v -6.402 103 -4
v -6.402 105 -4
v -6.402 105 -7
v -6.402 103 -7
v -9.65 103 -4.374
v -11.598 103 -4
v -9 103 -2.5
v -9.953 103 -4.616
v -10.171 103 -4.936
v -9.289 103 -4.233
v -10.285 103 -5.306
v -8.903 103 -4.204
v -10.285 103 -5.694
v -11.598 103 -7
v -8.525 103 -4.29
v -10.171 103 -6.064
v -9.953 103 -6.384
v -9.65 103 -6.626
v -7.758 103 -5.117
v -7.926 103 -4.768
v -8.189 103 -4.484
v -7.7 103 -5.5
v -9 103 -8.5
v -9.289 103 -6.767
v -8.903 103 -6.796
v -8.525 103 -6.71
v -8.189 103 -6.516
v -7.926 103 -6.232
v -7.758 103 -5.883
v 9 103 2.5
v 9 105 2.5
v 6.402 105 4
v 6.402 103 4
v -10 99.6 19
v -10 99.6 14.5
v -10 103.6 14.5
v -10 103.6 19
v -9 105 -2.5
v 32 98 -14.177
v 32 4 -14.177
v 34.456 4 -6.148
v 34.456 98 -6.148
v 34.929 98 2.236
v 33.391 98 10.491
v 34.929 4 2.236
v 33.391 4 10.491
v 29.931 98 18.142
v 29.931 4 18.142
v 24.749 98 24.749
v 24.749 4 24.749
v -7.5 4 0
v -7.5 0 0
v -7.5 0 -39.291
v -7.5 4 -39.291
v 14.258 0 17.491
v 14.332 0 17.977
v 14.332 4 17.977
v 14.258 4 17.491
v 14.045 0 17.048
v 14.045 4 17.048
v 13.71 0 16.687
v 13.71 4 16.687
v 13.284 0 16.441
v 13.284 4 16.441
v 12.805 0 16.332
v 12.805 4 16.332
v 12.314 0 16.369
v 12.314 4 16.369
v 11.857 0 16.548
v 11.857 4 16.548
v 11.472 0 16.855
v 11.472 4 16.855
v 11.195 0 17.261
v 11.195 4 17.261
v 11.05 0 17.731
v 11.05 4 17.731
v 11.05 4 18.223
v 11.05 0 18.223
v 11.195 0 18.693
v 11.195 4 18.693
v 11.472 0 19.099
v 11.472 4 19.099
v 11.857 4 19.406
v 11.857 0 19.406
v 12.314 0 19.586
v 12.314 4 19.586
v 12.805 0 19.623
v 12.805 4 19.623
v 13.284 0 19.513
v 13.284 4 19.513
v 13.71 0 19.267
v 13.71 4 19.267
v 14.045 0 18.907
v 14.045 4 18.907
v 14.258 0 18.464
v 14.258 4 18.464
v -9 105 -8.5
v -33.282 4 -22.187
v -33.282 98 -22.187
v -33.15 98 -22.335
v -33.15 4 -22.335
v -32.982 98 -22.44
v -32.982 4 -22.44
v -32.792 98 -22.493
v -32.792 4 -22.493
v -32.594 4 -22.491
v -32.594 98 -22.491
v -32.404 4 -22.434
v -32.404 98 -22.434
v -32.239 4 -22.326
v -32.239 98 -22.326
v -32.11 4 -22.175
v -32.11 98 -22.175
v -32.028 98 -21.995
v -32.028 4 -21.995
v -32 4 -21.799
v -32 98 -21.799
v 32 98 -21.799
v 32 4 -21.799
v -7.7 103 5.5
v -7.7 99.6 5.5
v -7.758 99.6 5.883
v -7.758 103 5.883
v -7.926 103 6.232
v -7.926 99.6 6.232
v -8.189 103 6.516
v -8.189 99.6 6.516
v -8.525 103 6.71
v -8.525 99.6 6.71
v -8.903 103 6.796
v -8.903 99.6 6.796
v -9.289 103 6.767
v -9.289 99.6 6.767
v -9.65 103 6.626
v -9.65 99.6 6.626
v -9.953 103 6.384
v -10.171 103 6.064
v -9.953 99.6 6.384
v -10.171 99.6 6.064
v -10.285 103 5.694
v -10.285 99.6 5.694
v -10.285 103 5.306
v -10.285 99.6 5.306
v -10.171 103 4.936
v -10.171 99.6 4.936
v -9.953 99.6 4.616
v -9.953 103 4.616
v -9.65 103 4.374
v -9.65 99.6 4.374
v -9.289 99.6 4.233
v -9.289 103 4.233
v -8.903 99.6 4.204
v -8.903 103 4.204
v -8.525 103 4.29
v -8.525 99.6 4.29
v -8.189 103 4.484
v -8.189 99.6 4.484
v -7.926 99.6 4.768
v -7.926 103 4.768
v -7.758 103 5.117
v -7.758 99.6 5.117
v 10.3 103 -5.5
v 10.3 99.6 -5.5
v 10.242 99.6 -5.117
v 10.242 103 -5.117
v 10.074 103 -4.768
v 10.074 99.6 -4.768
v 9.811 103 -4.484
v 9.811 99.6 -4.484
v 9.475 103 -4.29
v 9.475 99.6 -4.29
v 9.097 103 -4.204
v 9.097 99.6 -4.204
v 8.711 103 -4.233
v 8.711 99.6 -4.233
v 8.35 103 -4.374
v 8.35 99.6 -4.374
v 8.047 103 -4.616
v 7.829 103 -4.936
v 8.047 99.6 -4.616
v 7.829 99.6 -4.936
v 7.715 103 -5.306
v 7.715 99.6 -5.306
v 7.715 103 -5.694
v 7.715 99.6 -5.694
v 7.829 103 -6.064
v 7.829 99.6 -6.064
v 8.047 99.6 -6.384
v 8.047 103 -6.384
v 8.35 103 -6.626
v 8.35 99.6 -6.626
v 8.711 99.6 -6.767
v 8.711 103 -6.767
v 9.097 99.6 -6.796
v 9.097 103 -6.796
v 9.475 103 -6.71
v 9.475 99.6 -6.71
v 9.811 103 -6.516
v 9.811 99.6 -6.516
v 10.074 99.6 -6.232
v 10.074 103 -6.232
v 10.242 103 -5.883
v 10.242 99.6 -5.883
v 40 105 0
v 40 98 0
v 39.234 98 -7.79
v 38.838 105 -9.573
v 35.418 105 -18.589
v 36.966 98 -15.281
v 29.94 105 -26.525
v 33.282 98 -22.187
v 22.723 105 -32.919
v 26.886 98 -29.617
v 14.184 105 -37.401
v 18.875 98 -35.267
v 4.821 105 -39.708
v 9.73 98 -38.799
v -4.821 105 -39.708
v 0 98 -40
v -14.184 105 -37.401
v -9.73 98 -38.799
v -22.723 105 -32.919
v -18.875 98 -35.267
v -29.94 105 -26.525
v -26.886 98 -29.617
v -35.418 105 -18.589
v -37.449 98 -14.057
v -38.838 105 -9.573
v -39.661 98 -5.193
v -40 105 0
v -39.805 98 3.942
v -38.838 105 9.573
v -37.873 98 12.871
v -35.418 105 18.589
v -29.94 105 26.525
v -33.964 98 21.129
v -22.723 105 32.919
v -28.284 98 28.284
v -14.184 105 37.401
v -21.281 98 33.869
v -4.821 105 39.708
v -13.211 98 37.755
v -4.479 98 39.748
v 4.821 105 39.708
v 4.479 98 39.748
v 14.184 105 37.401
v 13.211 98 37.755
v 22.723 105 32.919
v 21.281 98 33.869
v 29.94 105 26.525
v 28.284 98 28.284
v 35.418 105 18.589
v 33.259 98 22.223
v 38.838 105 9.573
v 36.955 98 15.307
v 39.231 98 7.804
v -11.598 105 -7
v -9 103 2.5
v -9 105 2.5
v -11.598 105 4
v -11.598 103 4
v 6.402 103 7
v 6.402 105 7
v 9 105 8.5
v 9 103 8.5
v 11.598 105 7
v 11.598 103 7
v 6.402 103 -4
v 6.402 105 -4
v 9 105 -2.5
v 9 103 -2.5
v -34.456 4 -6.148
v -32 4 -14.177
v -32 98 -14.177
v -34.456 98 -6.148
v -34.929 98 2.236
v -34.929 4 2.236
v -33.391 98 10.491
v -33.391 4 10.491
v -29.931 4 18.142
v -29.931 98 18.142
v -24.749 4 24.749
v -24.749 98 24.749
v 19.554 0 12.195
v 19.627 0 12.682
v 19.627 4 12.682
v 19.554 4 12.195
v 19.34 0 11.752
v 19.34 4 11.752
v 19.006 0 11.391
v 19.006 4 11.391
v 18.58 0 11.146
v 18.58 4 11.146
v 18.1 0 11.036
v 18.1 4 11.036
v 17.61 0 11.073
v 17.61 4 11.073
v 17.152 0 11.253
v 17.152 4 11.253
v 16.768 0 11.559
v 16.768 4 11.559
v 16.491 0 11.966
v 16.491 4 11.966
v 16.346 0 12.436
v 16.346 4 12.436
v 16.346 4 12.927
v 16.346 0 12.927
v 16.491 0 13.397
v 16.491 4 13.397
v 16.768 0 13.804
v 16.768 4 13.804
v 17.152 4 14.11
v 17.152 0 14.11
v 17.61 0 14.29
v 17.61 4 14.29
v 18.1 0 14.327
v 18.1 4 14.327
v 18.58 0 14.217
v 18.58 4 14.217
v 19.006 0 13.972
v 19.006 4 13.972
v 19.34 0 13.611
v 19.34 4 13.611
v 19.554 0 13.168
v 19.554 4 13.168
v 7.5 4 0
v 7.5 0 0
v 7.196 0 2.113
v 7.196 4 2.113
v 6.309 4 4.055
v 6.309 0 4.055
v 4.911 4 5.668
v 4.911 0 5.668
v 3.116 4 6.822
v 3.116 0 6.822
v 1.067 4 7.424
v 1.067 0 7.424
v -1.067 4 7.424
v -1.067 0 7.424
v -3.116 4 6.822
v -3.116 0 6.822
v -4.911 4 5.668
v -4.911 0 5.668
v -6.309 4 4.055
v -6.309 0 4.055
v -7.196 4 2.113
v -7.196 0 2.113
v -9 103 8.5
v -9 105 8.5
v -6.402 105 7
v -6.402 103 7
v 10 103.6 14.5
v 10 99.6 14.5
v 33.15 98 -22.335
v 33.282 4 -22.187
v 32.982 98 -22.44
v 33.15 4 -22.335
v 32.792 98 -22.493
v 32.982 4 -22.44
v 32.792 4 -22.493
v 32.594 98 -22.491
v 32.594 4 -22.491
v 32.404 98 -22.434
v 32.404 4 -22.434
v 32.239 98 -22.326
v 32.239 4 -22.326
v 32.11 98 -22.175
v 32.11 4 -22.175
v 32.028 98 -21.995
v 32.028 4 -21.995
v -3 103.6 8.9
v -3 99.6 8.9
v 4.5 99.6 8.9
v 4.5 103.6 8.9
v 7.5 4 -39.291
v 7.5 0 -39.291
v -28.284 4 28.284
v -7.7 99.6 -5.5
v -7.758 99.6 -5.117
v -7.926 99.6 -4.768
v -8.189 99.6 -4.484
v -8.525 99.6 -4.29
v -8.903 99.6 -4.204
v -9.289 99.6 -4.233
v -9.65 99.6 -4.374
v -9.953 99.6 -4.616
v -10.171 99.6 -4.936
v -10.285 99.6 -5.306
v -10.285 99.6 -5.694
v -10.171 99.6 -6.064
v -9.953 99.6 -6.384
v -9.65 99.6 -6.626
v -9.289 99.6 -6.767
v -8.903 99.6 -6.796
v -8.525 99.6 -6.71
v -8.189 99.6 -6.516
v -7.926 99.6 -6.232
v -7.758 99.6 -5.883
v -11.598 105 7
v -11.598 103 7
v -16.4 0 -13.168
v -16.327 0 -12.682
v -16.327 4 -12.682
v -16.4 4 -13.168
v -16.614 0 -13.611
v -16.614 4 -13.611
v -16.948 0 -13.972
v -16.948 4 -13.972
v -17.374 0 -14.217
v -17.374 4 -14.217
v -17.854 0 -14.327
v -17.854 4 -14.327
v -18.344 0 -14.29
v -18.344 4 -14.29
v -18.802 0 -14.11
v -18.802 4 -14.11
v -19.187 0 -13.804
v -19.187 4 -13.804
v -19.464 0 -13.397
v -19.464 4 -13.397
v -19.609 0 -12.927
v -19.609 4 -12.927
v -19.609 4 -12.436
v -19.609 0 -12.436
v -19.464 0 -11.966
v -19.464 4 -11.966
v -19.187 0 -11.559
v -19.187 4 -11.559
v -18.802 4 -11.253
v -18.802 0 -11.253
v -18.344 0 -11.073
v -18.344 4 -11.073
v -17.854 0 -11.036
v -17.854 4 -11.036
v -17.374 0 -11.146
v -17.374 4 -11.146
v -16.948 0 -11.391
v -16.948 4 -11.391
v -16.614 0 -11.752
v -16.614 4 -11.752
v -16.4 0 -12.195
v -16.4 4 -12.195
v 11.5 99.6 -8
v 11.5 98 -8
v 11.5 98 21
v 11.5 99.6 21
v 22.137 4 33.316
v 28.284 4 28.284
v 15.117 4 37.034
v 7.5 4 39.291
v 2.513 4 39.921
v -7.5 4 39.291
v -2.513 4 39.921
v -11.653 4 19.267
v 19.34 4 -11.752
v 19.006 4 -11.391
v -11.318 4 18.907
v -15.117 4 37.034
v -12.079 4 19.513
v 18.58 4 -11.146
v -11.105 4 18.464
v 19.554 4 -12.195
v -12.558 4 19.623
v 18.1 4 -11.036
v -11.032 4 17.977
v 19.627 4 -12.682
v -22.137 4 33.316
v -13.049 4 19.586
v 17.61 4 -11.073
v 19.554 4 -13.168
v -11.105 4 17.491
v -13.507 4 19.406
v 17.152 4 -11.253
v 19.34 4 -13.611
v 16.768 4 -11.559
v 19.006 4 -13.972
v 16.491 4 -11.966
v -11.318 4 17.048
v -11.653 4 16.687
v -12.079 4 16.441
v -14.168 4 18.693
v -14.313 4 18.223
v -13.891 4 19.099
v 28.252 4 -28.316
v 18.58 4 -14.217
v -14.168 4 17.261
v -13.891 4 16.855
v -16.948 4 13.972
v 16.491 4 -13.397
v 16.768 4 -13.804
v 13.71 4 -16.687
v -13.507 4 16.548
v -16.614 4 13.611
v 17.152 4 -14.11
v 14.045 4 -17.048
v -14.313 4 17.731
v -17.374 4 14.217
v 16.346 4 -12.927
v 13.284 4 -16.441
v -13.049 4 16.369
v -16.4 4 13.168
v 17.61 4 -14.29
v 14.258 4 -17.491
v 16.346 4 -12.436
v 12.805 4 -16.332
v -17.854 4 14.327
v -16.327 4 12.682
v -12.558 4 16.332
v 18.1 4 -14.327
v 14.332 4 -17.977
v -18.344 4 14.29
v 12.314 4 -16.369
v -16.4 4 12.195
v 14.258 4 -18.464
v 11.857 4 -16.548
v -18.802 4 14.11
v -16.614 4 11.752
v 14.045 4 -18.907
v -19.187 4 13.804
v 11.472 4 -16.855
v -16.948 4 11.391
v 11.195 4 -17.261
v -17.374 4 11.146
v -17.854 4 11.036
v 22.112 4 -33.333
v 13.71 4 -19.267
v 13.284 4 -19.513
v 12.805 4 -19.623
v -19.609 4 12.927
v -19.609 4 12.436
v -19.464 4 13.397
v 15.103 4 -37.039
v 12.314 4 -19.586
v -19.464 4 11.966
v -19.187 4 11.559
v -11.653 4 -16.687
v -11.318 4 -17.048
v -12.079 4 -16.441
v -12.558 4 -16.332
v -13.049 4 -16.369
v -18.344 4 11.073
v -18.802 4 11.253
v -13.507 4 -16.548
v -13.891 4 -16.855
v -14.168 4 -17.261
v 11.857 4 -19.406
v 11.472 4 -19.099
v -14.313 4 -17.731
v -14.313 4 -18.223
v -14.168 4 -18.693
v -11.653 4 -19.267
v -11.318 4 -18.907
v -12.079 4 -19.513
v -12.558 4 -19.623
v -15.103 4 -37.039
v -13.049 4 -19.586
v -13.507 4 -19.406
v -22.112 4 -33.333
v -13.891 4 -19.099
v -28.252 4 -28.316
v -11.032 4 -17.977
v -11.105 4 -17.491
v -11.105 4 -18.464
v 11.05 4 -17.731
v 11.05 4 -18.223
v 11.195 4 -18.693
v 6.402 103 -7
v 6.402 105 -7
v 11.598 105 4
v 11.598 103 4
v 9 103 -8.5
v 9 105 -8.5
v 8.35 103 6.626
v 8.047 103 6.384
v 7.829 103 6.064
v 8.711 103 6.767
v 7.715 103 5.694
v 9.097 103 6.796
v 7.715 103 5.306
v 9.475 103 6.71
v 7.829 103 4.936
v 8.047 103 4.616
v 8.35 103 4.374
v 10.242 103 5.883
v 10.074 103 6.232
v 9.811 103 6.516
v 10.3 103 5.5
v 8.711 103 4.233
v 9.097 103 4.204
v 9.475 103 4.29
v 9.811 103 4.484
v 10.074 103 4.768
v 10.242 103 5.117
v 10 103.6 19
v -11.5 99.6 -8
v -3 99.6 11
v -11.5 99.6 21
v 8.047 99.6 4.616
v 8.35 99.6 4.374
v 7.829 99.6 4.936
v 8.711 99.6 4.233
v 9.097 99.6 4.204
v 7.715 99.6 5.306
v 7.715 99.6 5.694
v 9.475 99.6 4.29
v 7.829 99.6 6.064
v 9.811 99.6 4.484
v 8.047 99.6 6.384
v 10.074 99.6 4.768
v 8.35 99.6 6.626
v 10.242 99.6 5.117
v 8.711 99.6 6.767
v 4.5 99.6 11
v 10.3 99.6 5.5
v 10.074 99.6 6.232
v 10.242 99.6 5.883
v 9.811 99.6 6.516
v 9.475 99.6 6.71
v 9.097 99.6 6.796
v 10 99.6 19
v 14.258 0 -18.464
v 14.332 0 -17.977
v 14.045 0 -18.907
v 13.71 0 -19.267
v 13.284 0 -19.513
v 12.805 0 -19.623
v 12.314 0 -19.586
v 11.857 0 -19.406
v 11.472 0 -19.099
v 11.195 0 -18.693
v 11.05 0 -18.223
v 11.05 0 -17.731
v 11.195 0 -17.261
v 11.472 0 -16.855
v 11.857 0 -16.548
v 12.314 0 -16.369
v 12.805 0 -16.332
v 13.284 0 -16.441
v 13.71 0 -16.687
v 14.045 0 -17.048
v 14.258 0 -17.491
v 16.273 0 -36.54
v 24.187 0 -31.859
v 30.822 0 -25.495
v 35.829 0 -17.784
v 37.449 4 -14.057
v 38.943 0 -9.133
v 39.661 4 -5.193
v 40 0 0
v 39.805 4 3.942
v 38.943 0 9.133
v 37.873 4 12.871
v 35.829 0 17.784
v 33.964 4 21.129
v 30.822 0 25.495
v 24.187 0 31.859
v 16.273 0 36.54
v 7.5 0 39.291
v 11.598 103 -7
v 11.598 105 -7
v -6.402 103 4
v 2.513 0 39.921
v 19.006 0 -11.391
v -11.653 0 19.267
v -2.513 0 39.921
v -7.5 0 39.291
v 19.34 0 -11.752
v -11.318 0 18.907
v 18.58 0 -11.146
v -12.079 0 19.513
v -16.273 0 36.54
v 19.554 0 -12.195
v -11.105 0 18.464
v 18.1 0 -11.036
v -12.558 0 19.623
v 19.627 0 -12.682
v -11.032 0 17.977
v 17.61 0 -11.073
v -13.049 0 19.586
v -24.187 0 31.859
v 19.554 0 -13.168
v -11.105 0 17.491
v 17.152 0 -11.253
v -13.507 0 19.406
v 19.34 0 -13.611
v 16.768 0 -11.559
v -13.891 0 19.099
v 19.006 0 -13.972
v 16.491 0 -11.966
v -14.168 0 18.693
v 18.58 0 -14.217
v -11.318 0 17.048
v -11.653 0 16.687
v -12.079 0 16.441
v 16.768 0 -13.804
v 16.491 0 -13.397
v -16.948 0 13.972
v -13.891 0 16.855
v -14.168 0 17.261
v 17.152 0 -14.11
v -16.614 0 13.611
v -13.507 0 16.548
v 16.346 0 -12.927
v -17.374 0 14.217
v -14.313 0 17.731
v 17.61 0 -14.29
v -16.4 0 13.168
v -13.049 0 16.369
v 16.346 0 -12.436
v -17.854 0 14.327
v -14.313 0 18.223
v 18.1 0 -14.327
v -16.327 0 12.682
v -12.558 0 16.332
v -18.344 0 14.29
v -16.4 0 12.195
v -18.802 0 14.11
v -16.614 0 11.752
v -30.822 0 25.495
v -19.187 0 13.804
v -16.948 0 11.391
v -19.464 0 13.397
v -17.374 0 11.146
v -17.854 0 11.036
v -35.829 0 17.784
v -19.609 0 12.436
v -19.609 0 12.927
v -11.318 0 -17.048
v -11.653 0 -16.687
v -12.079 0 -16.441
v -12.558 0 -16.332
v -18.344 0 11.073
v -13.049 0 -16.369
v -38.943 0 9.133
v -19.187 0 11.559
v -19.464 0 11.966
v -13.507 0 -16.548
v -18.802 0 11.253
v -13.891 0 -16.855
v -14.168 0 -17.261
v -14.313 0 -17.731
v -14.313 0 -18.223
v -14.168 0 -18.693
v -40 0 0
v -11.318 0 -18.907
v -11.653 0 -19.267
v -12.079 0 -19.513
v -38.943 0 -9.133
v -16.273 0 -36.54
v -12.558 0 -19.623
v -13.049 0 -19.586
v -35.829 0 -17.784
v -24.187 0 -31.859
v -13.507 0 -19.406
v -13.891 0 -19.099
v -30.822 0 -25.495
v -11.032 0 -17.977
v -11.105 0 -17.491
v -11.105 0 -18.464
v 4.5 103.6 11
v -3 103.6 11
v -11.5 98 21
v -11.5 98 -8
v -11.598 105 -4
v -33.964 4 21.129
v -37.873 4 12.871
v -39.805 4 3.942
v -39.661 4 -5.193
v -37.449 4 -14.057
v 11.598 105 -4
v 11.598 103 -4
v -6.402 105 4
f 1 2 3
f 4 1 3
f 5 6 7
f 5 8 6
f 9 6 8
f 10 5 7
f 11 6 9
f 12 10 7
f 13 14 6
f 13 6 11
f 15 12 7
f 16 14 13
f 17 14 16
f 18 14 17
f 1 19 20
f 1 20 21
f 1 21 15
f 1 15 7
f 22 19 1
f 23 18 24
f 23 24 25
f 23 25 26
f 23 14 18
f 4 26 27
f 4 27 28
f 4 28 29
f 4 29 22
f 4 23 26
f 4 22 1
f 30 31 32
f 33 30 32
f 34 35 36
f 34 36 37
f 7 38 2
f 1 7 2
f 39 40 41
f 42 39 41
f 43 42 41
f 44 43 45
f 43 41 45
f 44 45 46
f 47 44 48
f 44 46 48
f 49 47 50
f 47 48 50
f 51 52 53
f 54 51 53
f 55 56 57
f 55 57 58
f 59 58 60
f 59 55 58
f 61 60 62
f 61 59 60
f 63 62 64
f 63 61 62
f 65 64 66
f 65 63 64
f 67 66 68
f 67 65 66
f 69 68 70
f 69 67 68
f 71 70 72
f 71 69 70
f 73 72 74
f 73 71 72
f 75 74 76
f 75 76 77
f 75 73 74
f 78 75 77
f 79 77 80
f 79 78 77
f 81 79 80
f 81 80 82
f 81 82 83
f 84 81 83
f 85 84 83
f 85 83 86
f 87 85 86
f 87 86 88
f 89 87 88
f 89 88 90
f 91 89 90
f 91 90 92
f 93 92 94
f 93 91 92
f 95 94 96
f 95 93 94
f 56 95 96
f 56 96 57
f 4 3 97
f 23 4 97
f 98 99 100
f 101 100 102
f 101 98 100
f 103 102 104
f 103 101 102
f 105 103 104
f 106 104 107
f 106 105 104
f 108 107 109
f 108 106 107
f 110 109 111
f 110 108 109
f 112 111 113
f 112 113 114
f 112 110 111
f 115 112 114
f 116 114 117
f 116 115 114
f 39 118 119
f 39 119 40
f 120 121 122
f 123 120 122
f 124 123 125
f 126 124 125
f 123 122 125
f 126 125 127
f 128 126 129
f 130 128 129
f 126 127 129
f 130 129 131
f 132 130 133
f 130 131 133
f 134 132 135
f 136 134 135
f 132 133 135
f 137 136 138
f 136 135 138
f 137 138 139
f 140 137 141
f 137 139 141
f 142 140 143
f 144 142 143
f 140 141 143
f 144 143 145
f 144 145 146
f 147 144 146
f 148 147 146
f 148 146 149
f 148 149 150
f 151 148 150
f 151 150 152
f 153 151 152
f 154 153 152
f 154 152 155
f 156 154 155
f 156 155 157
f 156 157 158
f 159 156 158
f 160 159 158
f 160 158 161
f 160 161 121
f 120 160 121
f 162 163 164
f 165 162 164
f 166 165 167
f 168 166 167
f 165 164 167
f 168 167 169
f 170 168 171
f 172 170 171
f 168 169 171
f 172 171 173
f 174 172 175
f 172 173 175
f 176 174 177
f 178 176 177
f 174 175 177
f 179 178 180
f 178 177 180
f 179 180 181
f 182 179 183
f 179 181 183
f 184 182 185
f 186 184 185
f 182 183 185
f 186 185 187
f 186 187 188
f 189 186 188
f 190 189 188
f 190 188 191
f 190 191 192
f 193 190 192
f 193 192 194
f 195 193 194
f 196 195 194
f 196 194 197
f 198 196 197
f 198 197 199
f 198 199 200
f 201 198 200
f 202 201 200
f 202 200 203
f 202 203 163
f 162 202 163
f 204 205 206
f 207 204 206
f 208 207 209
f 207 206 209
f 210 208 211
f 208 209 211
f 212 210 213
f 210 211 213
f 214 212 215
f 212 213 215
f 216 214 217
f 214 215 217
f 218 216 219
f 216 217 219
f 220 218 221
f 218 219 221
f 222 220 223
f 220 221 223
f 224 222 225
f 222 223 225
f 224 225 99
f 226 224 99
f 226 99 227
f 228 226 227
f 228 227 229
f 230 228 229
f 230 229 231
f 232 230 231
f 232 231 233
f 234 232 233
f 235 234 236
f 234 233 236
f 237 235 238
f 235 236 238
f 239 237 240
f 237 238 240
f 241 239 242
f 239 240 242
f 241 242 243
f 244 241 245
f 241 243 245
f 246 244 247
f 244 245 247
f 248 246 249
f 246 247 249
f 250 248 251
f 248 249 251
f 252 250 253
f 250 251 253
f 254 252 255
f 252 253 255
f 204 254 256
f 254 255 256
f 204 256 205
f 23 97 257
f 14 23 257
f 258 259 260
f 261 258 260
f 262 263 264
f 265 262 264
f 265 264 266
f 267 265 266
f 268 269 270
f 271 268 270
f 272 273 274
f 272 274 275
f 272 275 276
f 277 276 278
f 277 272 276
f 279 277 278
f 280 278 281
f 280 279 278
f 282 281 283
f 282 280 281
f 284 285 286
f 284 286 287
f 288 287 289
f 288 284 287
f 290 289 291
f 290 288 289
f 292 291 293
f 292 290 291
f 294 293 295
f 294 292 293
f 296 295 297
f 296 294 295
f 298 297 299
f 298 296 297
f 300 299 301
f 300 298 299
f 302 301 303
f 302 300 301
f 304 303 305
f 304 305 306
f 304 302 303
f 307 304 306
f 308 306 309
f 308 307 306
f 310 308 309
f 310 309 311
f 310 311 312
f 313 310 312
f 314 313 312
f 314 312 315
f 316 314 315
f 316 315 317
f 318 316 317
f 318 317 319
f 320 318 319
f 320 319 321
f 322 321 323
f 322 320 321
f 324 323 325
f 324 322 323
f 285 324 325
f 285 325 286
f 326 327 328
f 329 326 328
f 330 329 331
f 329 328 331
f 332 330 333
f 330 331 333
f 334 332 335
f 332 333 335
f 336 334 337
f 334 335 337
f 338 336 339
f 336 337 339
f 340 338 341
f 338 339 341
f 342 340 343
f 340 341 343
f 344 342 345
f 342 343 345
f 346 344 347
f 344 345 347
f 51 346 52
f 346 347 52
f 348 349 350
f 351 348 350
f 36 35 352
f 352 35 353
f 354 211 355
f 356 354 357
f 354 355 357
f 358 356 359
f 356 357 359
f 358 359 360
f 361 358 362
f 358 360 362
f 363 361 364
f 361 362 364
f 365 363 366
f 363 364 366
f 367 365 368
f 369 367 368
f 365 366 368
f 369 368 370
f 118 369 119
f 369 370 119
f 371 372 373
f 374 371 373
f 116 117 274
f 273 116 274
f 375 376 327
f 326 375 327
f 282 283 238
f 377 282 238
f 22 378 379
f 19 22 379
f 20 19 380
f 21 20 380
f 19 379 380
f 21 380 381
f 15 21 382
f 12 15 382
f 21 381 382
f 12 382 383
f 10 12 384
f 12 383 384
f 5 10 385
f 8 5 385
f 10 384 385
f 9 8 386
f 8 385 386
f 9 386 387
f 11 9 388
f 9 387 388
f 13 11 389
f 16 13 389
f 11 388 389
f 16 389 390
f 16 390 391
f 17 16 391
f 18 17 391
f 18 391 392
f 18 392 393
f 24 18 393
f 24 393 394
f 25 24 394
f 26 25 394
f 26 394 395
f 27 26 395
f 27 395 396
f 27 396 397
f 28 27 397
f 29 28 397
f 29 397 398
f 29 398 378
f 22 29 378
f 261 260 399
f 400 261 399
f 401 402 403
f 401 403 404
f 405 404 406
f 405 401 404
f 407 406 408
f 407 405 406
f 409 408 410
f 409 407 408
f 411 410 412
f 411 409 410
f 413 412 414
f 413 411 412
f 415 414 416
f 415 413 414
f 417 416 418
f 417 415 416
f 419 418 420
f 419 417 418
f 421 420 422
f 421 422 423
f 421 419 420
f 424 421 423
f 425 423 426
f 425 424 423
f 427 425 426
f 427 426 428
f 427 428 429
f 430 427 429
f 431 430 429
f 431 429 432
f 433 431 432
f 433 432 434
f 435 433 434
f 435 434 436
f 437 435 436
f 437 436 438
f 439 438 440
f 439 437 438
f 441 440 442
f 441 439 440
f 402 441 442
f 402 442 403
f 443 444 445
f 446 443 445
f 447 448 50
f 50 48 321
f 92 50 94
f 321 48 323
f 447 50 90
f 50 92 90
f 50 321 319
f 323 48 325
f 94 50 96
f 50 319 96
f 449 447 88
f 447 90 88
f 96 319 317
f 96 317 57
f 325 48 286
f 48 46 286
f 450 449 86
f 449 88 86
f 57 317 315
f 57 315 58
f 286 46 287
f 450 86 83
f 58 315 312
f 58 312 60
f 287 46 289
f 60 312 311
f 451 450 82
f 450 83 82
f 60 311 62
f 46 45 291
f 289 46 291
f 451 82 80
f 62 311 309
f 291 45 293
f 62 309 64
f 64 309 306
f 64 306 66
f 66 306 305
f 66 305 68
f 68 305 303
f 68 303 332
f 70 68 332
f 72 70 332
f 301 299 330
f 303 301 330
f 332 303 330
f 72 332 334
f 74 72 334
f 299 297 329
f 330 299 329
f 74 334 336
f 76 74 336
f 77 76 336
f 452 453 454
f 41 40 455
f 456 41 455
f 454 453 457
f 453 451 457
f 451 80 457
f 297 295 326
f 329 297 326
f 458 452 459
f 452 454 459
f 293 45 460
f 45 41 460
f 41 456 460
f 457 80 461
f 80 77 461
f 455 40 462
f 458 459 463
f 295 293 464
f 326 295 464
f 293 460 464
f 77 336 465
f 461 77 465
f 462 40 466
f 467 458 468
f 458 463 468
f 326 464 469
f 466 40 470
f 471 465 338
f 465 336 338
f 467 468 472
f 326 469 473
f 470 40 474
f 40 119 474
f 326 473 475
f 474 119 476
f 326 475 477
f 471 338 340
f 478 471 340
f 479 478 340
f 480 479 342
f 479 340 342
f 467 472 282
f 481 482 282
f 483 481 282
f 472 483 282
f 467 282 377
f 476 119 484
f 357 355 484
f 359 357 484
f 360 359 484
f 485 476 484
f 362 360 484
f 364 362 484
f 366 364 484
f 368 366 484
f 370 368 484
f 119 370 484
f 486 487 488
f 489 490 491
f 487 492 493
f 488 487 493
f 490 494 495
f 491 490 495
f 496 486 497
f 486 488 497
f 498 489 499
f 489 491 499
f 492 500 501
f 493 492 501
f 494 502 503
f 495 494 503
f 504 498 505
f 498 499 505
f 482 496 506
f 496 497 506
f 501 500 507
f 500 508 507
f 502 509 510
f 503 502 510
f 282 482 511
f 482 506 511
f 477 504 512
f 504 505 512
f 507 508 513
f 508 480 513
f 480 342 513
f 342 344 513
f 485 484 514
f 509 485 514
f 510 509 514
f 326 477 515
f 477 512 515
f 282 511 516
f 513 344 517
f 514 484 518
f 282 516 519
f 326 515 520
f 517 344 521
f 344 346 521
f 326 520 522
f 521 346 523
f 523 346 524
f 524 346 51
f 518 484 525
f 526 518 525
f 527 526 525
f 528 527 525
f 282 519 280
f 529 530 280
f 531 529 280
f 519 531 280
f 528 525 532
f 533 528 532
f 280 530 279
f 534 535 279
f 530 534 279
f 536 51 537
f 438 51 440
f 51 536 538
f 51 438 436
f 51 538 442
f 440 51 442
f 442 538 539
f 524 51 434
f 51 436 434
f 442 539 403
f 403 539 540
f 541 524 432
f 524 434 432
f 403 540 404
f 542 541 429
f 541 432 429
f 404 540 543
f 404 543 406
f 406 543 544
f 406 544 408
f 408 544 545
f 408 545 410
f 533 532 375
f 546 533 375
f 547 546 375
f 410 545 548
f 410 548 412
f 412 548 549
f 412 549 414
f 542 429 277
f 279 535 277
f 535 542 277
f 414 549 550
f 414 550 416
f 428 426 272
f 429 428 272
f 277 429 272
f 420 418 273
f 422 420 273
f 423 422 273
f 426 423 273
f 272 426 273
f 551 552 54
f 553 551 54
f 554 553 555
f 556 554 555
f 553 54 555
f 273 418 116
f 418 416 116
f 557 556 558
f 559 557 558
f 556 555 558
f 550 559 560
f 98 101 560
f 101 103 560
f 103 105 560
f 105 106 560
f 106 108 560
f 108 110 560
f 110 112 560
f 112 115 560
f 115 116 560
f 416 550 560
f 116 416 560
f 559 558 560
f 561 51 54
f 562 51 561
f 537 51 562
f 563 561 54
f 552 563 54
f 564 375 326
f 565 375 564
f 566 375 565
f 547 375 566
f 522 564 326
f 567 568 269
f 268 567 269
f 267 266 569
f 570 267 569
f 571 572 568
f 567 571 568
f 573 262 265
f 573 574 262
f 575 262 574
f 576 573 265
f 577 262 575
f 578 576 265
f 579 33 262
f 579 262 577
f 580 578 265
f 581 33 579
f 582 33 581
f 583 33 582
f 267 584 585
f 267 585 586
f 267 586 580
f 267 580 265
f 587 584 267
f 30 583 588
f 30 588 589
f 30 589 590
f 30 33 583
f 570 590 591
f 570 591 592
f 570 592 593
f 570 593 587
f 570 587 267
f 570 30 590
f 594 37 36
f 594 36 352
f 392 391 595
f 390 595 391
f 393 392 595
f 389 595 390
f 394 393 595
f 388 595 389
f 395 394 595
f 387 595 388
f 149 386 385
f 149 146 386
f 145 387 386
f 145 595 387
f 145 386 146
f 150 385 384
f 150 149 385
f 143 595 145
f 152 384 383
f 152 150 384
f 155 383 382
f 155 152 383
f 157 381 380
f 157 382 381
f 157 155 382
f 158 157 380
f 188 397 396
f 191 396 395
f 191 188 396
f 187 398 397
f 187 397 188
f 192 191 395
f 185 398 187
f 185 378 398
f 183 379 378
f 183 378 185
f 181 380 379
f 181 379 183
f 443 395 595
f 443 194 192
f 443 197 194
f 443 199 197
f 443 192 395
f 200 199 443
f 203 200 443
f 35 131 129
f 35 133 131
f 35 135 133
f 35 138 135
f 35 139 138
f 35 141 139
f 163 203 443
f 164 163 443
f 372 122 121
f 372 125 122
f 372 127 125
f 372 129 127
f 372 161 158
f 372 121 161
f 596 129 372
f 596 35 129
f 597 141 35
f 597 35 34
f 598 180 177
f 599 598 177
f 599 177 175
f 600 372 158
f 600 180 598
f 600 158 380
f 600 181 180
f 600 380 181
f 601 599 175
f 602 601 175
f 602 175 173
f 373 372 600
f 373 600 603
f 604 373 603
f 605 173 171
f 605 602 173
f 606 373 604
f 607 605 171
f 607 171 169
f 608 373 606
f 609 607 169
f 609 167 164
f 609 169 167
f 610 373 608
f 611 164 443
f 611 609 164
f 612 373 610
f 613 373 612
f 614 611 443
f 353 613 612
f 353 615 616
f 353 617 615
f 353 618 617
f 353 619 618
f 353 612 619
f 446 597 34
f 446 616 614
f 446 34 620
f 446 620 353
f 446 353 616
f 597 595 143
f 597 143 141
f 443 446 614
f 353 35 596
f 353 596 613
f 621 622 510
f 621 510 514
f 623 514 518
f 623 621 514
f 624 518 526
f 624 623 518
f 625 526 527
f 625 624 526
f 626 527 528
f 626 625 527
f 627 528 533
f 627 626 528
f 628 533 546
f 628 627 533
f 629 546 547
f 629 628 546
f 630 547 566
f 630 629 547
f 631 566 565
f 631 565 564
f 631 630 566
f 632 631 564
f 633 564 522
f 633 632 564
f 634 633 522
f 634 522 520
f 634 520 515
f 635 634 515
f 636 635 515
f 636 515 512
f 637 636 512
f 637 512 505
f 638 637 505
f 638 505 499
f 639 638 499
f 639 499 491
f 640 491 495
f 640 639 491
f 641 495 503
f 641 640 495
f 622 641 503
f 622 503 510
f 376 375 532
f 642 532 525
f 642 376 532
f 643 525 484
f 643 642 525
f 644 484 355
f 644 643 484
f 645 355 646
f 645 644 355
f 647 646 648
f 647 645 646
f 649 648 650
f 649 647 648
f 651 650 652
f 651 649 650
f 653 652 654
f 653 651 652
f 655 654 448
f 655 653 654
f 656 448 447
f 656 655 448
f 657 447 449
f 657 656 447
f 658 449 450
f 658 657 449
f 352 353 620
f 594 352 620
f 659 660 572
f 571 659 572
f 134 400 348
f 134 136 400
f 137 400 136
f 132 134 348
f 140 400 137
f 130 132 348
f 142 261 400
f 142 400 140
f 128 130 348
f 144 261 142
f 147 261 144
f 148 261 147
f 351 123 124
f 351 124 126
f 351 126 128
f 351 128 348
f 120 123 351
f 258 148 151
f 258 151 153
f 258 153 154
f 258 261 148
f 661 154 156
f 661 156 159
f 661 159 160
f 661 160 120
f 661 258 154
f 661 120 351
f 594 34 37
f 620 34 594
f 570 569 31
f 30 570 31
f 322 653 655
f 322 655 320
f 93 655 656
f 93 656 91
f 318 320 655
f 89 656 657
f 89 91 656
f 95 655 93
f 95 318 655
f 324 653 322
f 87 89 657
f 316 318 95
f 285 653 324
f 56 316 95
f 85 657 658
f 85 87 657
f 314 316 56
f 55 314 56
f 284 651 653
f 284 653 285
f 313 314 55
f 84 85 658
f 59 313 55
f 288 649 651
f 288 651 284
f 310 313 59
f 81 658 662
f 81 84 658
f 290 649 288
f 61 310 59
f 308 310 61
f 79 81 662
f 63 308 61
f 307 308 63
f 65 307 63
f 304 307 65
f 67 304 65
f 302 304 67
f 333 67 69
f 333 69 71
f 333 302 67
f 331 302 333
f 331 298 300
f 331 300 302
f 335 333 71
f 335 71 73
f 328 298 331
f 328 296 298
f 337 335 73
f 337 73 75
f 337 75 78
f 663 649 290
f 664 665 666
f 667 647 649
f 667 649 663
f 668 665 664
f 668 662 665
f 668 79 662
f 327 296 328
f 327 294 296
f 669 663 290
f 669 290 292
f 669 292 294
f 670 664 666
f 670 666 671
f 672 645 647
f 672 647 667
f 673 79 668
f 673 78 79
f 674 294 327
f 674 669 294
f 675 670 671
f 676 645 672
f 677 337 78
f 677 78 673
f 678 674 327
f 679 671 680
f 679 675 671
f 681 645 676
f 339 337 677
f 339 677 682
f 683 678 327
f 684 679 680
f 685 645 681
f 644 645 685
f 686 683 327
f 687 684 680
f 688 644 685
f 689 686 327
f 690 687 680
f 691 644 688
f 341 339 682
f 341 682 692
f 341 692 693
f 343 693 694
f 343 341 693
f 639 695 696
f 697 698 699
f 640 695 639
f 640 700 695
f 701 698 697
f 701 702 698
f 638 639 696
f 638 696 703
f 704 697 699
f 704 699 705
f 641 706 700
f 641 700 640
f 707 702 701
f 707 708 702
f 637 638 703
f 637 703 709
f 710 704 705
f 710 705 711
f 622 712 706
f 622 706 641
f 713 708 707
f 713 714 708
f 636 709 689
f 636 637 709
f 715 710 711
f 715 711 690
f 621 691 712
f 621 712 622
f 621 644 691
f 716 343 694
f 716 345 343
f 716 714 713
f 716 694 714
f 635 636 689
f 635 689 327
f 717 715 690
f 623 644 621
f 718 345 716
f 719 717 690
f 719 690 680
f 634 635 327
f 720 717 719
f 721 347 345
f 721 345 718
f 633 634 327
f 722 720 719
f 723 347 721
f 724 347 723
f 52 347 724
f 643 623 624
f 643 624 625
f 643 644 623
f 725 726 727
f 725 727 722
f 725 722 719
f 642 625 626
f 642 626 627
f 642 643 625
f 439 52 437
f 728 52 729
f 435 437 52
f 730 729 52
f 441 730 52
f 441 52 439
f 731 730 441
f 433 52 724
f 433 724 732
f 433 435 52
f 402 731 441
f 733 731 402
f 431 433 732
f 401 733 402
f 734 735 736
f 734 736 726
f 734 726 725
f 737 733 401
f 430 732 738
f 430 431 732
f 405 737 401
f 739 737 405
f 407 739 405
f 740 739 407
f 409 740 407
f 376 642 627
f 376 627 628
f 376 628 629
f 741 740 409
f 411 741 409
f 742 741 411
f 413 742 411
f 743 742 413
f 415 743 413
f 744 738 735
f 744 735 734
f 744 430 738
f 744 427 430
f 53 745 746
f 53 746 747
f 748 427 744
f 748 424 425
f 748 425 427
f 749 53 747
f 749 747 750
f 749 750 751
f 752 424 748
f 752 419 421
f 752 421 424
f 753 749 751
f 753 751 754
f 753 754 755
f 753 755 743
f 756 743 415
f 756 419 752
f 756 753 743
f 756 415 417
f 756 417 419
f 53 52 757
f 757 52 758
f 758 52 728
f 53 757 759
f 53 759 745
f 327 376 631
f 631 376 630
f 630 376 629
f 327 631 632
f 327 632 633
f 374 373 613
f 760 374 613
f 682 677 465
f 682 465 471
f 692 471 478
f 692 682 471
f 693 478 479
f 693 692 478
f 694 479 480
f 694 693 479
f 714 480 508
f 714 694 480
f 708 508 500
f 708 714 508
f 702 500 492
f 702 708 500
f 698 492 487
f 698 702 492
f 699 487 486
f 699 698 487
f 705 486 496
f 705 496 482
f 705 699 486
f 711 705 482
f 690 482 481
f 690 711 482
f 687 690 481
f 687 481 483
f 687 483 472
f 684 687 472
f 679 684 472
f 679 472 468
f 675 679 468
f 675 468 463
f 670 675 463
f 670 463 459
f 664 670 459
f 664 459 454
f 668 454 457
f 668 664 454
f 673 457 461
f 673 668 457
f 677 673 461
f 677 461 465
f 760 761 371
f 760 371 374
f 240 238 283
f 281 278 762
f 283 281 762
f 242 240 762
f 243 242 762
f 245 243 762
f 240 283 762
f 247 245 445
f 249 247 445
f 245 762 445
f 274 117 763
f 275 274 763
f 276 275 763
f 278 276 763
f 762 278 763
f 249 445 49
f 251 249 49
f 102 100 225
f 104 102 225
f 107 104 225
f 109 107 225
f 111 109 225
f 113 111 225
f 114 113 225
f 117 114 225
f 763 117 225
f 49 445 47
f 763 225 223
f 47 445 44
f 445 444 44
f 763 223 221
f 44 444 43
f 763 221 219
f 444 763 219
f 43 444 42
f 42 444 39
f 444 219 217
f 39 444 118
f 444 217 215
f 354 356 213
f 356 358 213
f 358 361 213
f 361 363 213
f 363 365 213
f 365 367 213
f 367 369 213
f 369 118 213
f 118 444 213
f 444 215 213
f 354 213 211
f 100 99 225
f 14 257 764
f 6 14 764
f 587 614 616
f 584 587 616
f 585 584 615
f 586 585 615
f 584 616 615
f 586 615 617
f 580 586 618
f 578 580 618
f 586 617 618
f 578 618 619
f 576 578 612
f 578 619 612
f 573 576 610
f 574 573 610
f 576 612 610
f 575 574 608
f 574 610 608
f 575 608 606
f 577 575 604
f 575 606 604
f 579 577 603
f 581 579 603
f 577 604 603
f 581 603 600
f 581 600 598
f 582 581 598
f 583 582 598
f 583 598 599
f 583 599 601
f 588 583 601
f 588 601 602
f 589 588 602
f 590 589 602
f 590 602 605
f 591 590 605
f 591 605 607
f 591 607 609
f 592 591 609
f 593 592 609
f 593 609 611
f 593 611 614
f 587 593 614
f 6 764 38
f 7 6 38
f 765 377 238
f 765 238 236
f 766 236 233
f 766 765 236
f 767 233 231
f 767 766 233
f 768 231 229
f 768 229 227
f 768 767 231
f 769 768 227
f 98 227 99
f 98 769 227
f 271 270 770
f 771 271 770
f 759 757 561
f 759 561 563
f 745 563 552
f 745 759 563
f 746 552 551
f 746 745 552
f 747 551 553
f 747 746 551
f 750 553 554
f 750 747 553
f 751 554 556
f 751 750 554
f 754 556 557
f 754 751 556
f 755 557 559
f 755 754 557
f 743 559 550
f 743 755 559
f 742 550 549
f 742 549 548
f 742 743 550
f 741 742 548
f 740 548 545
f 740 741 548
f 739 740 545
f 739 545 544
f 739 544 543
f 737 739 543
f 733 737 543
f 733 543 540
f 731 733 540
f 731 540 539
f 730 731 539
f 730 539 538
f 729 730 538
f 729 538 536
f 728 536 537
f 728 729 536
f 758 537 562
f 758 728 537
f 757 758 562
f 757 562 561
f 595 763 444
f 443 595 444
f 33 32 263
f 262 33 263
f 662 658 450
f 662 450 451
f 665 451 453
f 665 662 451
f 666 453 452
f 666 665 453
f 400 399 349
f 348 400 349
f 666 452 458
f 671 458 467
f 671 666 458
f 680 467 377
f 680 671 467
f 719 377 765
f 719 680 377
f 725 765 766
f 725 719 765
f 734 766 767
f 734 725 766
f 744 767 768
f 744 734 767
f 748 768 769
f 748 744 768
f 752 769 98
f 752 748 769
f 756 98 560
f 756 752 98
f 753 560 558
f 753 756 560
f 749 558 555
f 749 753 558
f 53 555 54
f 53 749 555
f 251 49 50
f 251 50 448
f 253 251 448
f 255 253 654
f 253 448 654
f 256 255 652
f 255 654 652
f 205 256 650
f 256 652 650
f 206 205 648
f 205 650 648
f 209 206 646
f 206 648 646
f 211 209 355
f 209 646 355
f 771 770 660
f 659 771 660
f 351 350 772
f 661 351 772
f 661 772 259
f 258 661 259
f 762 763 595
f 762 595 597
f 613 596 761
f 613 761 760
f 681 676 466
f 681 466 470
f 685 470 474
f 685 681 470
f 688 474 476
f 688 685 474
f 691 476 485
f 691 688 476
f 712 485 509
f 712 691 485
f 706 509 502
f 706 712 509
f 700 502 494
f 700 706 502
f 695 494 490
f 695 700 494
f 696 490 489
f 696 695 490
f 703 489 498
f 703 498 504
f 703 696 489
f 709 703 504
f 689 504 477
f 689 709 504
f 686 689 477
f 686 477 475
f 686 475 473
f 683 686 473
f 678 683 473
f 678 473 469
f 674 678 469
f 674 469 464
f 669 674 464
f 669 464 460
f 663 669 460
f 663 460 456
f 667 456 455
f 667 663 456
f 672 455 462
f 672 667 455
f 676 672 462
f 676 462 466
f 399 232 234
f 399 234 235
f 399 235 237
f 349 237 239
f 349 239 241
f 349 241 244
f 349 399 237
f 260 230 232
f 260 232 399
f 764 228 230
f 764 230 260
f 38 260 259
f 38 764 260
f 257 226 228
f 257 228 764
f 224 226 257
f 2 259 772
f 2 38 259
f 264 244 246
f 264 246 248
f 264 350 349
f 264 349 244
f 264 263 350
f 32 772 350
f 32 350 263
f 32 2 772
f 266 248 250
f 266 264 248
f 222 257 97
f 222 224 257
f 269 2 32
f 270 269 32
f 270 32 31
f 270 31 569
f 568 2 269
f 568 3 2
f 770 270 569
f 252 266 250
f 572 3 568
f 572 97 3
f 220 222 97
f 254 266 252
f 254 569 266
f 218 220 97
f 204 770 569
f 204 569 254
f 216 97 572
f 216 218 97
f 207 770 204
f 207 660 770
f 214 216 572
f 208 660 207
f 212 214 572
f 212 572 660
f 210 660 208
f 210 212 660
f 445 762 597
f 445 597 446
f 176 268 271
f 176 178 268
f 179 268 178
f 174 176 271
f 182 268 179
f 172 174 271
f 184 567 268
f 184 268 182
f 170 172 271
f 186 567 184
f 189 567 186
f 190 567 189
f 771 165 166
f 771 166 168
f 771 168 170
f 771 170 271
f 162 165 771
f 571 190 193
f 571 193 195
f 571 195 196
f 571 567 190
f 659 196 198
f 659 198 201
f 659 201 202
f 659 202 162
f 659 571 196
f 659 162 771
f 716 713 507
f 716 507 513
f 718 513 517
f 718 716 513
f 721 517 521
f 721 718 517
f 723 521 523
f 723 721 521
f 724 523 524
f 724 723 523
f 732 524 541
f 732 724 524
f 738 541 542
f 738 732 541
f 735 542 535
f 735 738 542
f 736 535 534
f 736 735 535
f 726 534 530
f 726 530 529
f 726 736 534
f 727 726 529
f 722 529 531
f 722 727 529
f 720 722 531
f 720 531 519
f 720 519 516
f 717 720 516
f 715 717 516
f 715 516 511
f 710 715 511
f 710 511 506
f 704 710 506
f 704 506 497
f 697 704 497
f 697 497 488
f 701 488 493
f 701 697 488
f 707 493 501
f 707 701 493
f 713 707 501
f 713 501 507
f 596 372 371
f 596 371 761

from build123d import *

# Parameters (mm, degrees)
SKETCH1_R           = 1.65
BOSS_EXTRUDE1_DEPTH = 4
BOSS_EXTRUDE2_DEPTH = 94
SKETCH3_R           = 40
BOSS_EXTRUDE3_DEPTH = 7
SKETCH4_R           = 1.3
CUT_EXTRUDE1_DEPTH  = 22
SKETCH5_W           = 23
SKETCH5_H           = 29
CUT_EXTRUDE2_DEPTH  = 1.6
SKETCH6_W           = 7.5
SKETCH6_H           = 2.1
SKETCH6_W_2         = 20
SKETCH6_H_2         = 4.5
CUT_EXTRUDE3_DEPTH  = 4
CUT_EXTRUDE4_DEPTH  = 2
BOSS_EXTRUDE4_DEPTH = 4
CUT_EXTRUDE5_DEPTH  = 4


with BuildPart() as part:
    # Sketch1 → Boss-Extrude1 (new body)
    with BuildSketch(Plane(origin=(0, 0, 0), x_dir=(1, 0, 0), z_dir=(0, 1, 0))):
        with BuildLine():
            Line((-7.5, 0), (-7.5, -39.290584114))
            ThreePointArc((-7.5, -39.290584114), (0, 40), (7.5, -39.290584114))
            Line((7.5, -39.290584114), (7.5, 0))
            ThreePointArc((7.5, 0), (0, 7.5), (-7.5, 0))
        make_face()
        with Locations((-17.977187763, 12.681510956)):
            Circle(SKETCH1_R, mode=Mode.SUBTRACT)
        with Locations((-12.681510956, 17.977187763)):
            Circle(SKETCH1_R, mode=Mode.SUBTRACT)
        with Locations((12.681510956, 17.977187763)):
            Circle(SKETCH1_R, mode=Mode.SUBTRACT)
        with Locations((17.977187763, 12.681510956)):
            Circle(SKETCH1_R, mode=Mode.SUBTRACT)
        with Locations((17.977187763, -12.681510956)):
            Circle(SKETCH1_R, mode=Mode.SUBTRACT)
        with Locations((12.681510956, -17.977187763)):
            Circle(SKETCH1_R, mode=Mode.SUBTRACT)
        with Locations((-12.681510956, -17.977187763)):
            Circle(SKETCH1_R, mode=Mode.SUBTRACT)
        with Locations((-17.977187763, -12.681510956)):
            Circle(SKETCH1_R, mode=Mode.SUBTRACT)
    extrude(amount=BOSS_EXTRUDE1_DEPTH)

    # Sketch2 → Boss-Extrude2 (add)
    with BuildSketch(Plane(origin=(0, 4, 0), x_dir=(1, 0, 0), z_dir=(0, 1, 0))):
        with BuildLine():
            Line((-24.748737342, -24.748737342), (-28.284271247, -28.284271247))
            ThreePointArc((-28.284271247, -28.284271247), (-39.805294785, -3.941891309), (-33.282442748, 22.187361374))
            ThreePointArc((-33.282442748, 22.187361374), (-32.497157603, 22.469048938), (-32, 21.79908255))
            Line((-32, 21.79908255), (-32, 14.177446879))
            ThreePointArc((-32, 14.177446879), (-34.408091373, -6.409621521), (-24.748737342, -24.748737342))
        make_face()
        with BuildLine():
            Line((24.748737342, -24.748737342), (28.284271247, -28.284271247))
            ThreePointArc((28.284271247, -28.284271247), (39.805294785, -3.941891309), (33.282442748, 22.187361374))
            ThreePointArc((33.282442748, 22.187361374), (32.497157603, 22.469048938), (32, 21.79908255))
            Line((32, 21.79908255), (32, 14.177446879))
            ThreePointArc((32, 14.177446879), (34.408091373, -6.409621521), (24.748737342, -24.748737342))
        make_face()
    extrude(amount=BOSS_EXTRUDE2_DEPTH)

    # Sketch3 → Boss-Extrude3 (add)
    with BuildSketch(Plane(origin=(0, 98, 0), x_dir=(1, 0, 0), z_dir=(0, 1, 0))):
        Circle(SKETCH3_R)
    extrude(amount=BOSS_EXTRUDE3_DEPTH)

    # Sketch4 → Cut-Extrude1 (cut)
    with BuildSketch(Plane.XZ.offset(-98)):
        with Locations((9, -5.5)):
            Circle(SKETCH4_R)
        with Locations((-9, -5.5)):
            Circle(SKETCH4_R)
        with Locations((9, 5.5)):
            Circle(SKETCH4_R)
        with Locations((-9, 5.5)):
            Circle(SKETCH4_R)
    extrude(amount=-CUT_EXTRUDE1_DEPTH, mode=Mode.SUBTRACT)

    # Sketch5 → Cut-Extrude2 (cut)
    with BuildSketch(Plane.XZ.offset(-98)):
        with Locations((0, 6.5)):
            Rectangle(SKETCH5_W, SKETCH5_H)
    extrude(amount=-CUT_EXTRUDE2_DEPTH, mode=Mode.SUBTRACT)

    # Sketch6 → Cut-Extrude3 (cut)
    with BuildSketch(Plane.XZ.offset(-99.6)):
        with Locations((0.75, 9.95)):
            Rectangle(SKETCH6_W, SKETCH6_H)
        with Locations((0, 16.75)):
            Rectangle(SKETCH6_W_2, SKETCH6_H_2)
    extrude(amount=-CUT_EXTRUDE3_DEPTH, mode=Mode.SUBTRACT)

    # Sketch7 → Cut-Extrude4 (cut)
    with BuildSketch(Plane(origin=(0, 105, 0), x_dir=(1, 0, 0), z_dir=(0, 1, 0))):
        Polygon((9, -8.5), (11.598076211, -7), (11.598076211, -4), (9, -2.5), (6.401923789, -4), (6.401923789, -7), align=None)
        Polygon((-9, 2.5), (-6.401923789, 4), (-6.401923789, 7), (-9, 8.5), (-11.598076211, 7), (-11.598076211, 4), align=None)
        Polygon((-9, -8.5), (-6.401923789, -7), (-6.401923789, -4), (-9, -2.5), (-11.598076211, -4), (-11.598076211, -7), align=None)
        Polygon((9, 2.5), (11.598076211, 4), (11.598076211, 7), (9, 8.5), (6.401923789, 7), (6.401923789, 4), align=None)
    extrude(amount=-CUT_EXTRUDE4_DEPTH, mode=Mode.SUBTRACT)

    # Sketch8 → Boss-Extrude4 (add)
    with BuildSketch(Plane.XZ):
        with BuildLine():
            Line((-7.935549944, -8.30342312), (8.145763187, -8.30342312))
            Line((8.145763187, -8.30342312), (8.145763187, 39.161799526))
            ThreePointArc((8.145763187, 39.161799526), (0.107296793, 39.999856092), (-7.935549944, 39.204936514))
            Line((-7.935549944, 39.204936514), (-7.935549944, -8.30342312))
        make_face()
    extrude(amount=-BOSS_EXTRUDE4_DEPTH)

    # Sketch9 → Cut-Extrude5 (cut)
    with BuildSketch(Plane.XZ):
        with BuildLine():
            Line((-7.5, 0), (-7.5, -42.568181818))
            Line((-7.5, -42.568181818), (7.5, -42.568181818))
            Line((7.5, -42.568181818), (7.5, 0))
            ThreePointArc((7.5, 0), (0, 7.5), (-7.5, 0))
        make_face()
    extrude(amount=-CUT_EXTRUDE5_DEPTH, mode=Mode.SUBTRACT)


solid = part.part
